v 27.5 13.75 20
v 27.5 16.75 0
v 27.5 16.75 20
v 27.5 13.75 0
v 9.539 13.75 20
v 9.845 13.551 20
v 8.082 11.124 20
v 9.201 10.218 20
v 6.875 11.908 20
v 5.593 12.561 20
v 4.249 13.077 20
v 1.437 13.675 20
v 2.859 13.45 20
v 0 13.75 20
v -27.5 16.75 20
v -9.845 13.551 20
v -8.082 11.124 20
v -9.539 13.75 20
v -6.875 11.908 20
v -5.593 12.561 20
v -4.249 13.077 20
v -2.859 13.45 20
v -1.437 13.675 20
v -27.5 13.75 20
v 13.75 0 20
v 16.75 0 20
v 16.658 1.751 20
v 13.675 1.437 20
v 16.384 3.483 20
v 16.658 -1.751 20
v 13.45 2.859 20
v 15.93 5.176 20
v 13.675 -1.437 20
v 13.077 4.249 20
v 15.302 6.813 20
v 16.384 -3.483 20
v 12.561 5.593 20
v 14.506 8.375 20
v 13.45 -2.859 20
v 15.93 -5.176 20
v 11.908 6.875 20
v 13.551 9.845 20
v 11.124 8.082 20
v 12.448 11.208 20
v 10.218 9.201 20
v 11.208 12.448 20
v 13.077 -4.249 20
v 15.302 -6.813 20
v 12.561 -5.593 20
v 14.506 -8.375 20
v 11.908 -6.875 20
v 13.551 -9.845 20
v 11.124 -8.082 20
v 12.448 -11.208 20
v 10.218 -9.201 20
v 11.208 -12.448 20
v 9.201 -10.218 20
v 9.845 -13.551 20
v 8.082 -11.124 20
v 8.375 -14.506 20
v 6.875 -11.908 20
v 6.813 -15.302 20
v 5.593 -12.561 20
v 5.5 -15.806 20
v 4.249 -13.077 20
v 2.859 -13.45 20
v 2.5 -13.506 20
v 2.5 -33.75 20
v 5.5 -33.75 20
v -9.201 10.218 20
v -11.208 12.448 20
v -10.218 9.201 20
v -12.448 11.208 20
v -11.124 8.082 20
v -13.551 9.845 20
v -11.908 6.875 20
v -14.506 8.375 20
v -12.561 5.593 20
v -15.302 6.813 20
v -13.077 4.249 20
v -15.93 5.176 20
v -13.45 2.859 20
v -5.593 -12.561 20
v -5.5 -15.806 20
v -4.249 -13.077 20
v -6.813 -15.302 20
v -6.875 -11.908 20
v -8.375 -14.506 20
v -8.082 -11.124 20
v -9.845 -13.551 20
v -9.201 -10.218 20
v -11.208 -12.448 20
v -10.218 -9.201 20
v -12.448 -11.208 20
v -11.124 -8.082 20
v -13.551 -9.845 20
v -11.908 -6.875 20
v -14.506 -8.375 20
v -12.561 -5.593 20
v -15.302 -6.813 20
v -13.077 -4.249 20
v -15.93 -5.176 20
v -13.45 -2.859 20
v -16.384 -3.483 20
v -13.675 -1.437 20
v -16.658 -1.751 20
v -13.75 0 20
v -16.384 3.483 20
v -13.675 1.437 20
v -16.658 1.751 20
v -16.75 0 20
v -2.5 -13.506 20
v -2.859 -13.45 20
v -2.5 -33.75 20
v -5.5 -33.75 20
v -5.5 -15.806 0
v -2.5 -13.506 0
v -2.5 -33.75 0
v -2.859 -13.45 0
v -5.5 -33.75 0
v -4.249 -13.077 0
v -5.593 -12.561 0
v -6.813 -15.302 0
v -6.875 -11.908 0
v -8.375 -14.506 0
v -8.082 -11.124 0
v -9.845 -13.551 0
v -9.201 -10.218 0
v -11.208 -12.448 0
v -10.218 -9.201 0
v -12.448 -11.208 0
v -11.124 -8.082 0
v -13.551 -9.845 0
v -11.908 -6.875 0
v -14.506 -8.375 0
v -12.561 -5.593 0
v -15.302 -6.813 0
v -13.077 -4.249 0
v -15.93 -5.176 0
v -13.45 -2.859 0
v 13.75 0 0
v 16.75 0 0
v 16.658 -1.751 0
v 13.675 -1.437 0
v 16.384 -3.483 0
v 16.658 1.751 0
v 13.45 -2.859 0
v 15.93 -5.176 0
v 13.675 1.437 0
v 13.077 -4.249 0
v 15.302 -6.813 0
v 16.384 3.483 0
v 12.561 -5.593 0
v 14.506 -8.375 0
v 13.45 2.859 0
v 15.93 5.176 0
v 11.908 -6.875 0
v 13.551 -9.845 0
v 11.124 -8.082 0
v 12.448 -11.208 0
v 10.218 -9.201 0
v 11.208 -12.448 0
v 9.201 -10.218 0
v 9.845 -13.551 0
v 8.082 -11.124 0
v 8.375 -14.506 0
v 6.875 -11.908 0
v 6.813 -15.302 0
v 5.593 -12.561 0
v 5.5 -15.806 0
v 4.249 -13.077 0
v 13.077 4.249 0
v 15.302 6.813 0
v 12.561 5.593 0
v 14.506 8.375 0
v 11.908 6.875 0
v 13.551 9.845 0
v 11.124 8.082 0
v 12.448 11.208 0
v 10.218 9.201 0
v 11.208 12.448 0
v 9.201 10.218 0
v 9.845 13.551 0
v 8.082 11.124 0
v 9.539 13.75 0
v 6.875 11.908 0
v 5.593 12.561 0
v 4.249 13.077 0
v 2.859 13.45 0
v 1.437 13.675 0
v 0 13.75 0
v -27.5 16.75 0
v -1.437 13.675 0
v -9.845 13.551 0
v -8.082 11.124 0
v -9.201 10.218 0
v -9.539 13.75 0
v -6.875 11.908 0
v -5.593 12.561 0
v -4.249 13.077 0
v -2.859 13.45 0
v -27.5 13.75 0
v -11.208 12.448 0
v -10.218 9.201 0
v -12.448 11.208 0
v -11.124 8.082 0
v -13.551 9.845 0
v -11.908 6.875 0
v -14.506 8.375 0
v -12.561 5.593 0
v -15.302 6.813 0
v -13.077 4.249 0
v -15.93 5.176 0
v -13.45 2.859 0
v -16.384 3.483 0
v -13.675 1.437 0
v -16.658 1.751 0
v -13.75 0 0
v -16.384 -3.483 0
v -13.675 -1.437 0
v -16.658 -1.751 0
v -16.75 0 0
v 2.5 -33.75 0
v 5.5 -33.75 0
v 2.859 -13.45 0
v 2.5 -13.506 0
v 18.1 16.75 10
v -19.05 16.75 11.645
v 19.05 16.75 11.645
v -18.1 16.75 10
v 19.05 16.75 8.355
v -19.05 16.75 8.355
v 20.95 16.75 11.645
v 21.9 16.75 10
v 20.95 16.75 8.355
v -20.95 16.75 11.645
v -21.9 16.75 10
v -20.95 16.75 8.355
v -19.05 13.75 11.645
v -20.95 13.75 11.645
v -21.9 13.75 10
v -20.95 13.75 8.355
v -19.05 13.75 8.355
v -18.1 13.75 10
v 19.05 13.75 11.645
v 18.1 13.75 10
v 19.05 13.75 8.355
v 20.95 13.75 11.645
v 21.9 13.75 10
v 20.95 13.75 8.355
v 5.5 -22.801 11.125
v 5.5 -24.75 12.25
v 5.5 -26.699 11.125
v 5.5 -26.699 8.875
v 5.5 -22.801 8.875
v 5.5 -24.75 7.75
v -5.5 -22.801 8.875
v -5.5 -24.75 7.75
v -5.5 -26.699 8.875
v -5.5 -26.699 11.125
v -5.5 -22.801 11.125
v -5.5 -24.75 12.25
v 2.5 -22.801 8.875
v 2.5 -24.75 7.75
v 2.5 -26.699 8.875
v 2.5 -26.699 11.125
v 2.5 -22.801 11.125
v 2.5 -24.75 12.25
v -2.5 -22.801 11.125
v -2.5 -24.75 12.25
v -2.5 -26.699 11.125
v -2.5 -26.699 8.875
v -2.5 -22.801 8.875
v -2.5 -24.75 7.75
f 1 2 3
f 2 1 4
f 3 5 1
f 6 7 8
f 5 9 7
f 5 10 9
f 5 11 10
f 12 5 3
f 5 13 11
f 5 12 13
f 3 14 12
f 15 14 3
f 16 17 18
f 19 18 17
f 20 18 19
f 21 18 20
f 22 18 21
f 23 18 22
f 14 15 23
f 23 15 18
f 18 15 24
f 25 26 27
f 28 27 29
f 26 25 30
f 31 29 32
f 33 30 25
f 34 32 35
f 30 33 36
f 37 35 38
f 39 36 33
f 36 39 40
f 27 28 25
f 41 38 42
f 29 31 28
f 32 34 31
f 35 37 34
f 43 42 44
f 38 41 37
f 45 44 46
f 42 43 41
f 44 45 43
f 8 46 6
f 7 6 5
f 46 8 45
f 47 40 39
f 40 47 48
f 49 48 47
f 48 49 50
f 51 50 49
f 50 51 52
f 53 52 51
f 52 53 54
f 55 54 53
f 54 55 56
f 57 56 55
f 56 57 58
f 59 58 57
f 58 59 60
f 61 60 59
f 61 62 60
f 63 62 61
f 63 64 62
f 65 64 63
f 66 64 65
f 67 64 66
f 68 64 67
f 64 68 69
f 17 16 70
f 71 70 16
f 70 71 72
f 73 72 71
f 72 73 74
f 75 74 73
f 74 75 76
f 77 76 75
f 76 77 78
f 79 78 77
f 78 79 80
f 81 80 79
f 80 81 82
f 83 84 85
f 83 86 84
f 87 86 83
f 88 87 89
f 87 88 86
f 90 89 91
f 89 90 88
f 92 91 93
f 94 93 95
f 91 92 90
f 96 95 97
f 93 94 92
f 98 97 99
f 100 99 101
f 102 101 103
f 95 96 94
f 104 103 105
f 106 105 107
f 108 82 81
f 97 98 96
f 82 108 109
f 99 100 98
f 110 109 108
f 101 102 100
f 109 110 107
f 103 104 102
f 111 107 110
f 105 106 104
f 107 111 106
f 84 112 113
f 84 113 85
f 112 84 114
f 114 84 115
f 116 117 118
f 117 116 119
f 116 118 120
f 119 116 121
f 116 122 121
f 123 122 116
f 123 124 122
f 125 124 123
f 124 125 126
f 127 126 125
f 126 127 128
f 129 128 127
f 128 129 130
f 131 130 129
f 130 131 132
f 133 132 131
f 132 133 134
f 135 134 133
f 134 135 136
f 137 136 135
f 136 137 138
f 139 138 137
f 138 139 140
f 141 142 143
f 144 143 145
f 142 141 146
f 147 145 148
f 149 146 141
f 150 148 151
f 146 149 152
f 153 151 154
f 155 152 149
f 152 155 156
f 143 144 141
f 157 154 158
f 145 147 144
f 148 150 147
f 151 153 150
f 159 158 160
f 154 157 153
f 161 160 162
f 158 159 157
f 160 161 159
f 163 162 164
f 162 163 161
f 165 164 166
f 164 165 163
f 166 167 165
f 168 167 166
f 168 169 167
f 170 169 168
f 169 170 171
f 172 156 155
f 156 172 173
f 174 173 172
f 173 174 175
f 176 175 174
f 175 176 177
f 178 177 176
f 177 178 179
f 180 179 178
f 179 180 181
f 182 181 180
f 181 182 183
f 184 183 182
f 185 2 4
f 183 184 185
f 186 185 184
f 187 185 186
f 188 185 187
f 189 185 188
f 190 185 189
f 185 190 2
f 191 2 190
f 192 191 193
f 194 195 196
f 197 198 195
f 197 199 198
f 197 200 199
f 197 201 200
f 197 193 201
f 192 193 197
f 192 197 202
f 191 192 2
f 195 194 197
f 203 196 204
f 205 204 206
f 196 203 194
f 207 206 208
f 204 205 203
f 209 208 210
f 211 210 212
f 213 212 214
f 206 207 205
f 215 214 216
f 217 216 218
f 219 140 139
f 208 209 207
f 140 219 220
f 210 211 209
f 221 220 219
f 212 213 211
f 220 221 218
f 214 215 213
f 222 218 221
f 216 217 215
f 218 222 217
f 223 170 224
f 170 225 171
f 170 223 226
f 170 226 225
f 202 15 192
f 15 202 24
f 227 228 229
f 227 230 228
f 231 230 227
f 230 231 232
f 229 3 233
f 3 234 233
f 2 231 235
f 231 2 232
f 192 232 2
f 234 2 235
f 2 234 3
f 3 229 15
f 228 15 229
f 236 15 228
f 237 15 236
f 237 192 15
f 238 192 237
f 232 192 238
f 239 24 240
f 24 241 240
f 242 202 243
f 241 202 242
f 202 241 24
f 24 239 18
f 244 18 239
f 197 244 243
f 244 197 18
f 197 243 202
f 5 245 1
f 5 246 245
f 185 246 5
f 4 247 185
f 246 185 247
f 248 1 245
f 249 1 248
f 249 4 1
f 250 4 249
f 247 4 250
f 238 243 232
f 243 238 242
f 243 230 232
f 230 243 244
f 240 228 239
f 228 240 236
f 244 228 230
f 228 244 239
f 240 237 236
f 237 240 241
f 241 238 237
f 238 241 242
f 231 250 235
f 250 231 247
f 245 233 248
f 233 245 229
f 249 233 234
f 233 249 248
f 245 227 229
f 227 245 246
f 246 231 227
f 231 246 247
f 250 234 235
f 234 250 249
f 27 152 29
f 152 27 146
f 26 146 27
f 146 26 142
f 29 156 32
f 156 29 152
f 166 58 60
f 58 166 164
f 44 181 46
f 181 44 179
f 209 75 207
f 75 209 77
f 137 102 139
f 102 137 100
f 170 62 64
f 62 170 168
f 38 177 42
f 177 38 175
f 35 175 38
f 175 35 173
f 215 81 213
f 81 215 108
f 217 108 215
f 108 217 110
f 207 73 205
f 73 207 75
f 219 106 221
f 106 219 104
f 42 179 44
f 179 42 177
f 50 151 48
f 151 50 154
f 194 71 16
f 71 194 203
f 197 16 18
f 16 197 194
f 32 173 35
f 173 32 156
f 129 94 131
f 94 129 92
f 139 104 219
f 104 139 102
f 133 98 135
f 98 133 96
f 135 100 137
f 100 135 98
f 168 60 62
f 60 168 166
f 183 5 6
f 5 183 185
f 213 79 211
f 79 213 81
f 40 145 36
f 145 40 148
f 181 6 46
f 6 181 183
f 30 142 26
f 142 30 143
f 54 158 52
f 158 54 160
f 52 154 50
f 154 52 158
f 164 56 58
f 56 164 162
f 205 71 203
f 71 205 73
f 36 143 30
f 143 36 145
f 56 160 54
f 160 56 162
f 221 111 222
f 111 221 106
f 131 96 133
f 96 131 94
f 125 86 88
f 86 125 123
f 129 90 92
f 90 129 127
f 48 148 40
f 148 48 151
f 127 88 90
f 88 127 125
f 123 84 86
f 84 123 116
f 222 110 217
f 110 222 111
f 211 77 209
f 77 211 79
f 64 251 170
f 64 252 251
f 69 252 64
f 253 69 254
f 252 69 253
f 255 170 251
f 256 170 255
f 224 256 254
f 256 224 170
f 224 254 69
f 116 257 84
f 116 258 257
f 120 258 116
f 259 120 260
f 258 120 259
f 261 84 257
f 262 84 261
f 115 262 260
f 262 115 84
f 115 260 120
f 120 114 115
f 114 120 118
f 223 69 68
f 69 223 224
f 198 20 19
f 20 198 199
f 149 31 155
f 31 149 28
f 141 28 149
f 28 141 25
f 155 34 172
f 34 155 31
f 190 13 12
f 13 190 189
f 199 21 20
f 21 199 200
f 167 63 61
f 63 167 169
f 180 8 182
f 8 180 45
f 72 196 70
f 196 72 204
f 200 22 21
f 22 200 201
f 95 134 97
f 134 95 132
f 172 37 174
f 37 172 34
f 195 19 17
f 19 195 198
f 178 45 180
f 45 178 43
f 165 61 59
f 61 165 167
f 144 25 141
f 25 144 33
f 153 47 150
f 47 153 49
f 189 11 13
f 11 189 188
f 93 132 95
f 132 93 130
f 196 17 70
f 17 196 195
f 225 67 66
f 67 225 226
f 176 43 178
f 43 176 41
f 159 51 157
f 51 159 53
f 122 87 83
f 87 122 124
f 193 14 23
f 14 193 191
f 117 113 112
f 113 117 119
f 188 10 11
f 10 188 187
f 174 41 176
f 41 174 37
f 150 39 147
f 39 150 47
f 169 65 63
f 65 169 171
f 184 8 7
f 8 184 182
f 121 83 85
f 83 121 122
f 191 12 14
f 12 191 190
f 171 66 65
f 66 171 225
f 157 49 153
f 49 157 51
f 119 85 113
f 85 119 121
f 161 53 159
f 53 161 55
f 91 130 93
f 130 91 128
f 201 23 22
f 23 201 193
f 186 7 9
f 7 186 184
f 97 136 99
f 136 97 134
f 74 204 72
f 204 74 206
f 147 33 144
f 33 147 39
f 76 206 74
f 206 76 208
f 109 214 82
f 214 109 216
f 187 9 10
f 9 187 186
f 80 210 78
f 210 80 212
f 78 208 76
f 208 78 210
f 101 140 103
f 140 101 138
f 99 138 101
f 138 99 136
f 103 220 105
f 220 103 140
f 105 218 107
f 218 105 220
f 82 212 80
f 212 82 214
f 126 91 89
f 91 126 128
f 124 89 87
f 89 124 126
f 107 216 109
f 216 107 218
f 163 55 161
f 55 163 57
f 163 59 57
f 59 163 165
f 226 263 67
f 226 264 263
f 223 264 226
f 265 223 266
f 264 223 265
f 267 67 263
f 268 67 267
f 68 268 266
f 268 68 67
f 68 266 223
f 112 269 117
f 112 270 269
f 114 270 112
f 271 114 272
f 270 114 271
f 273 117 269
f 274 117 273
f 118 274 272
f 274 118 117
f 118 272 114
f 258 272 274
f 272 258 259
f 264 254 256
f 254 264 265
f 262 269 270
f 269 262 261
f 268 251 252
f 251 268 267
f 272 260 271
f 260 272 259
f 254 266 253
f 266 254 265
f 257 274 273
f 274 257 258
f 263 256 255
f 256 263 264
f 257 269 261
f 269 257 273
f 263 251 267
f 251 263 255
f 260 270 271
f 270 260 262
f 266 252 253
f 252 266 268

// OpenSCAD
shaftDiameter = 27.5 ; // SCH40 PVC 3/4" OD + 1mm tolerance
clampWidth = 20 ;
clampThickness = 3.0 ;
clampLegLengthFromShaft = 20 ; // room for wing nut and thumb srew
clampLegThickness = clampThickness + 0 ; // default is 'clampThickness' to keep it the same thickness as the clamp
clampLegGap = 5 ; 
clampToClampScrewCenter = (clampLegLengthFromShaft - clampThickness) / 2 - 0.5 ; //using '(clampLegLengthFromShaft - clampThickness) / 2' nearly centres this hole on the clamp leg
clampScrewDiameter = 4.5 ; // #8 clearance hole
shaftToMountPlate = 0 ;
mountPlateThickness = 3.0 ;
mountPlateLength = 55 ;
mountHoleSpacing = 40 ;
mountHoleDiameter = 3.8 ; // #6 self threading hardware clearance hole
screwHoleSmoothness = 6 ; //6 = printable vertically. Applies to mount plate screw holes and clamp leg screw holes
clampSmoothness = 60 ;

clampWithMountPlate();

/*
translate([50,0,50]) clamp();
*/

module clampWithMountPlate(){
	union(){
		translate([0,shaftDiameter / 2 + shaftToMountPlate + mountPlateThickness / 2,clampWidth / 2])
			difference(){
				cube([mountPlateLength,mountPlateThickness,clampWidth], center = true);
				translate([-mountHoleSpacing / 2,0,0]) rotate([90,0,0]) cylinder(r = mountHoleDiameter / 2, h = mountPlateThickness + 2, center = true, $fn = screwHoleSmoothness);
				translate([mountHoleSpacing / 2,0,0]) rotate([90,0,0]) cylinder(r = mountHoleDiameter / 2, h = mountPlateThickness + 2, center = true, $fn = screwHoleSmoothness);
			}
		clamp();
	}
}


 module clamp(){
	difference(){
		union(){
			cylinder(r = shaftDiameter / 2 + clampThickness, h = clampWidth, $fn = clampSmoothness);
			translate([0,-(shaftDiameter / 2 + clampLegLengthFromShaft) / 2,clampWidth / 2]) cube([clampLegThickness * 2 + clampLegGap, shaftDiameter / 2 + clampLegLengthFromShaft,clampWidth], center = true);
		}
			translate([0,0,-1]) cylinder(r = shaftDiameter / 2,h = clampWidth + 2, $fn = clampSmoothness);			
			translate([0, -(shaftDiameter / 4 + clampLegLengthFromShaft ) + 0.1, clampWidth / 2]) cube([clampLegGap, shaftDiameter / 2 + clampLegLengthFromShaft * 2, clampWidth + 2], center = true);
			translate([0, -(shaftDiameter / 2 + clampThickness + clampToClampScrewCenter ), clampWidth / 2]) rotate([0, 90, 0]) cylinder(r = clampScrewDiameter / 2, h = clampLegThickness * 2 + clampLegGap + 2,center = true, $fn = screwHoleSmoothness);
	}
}
